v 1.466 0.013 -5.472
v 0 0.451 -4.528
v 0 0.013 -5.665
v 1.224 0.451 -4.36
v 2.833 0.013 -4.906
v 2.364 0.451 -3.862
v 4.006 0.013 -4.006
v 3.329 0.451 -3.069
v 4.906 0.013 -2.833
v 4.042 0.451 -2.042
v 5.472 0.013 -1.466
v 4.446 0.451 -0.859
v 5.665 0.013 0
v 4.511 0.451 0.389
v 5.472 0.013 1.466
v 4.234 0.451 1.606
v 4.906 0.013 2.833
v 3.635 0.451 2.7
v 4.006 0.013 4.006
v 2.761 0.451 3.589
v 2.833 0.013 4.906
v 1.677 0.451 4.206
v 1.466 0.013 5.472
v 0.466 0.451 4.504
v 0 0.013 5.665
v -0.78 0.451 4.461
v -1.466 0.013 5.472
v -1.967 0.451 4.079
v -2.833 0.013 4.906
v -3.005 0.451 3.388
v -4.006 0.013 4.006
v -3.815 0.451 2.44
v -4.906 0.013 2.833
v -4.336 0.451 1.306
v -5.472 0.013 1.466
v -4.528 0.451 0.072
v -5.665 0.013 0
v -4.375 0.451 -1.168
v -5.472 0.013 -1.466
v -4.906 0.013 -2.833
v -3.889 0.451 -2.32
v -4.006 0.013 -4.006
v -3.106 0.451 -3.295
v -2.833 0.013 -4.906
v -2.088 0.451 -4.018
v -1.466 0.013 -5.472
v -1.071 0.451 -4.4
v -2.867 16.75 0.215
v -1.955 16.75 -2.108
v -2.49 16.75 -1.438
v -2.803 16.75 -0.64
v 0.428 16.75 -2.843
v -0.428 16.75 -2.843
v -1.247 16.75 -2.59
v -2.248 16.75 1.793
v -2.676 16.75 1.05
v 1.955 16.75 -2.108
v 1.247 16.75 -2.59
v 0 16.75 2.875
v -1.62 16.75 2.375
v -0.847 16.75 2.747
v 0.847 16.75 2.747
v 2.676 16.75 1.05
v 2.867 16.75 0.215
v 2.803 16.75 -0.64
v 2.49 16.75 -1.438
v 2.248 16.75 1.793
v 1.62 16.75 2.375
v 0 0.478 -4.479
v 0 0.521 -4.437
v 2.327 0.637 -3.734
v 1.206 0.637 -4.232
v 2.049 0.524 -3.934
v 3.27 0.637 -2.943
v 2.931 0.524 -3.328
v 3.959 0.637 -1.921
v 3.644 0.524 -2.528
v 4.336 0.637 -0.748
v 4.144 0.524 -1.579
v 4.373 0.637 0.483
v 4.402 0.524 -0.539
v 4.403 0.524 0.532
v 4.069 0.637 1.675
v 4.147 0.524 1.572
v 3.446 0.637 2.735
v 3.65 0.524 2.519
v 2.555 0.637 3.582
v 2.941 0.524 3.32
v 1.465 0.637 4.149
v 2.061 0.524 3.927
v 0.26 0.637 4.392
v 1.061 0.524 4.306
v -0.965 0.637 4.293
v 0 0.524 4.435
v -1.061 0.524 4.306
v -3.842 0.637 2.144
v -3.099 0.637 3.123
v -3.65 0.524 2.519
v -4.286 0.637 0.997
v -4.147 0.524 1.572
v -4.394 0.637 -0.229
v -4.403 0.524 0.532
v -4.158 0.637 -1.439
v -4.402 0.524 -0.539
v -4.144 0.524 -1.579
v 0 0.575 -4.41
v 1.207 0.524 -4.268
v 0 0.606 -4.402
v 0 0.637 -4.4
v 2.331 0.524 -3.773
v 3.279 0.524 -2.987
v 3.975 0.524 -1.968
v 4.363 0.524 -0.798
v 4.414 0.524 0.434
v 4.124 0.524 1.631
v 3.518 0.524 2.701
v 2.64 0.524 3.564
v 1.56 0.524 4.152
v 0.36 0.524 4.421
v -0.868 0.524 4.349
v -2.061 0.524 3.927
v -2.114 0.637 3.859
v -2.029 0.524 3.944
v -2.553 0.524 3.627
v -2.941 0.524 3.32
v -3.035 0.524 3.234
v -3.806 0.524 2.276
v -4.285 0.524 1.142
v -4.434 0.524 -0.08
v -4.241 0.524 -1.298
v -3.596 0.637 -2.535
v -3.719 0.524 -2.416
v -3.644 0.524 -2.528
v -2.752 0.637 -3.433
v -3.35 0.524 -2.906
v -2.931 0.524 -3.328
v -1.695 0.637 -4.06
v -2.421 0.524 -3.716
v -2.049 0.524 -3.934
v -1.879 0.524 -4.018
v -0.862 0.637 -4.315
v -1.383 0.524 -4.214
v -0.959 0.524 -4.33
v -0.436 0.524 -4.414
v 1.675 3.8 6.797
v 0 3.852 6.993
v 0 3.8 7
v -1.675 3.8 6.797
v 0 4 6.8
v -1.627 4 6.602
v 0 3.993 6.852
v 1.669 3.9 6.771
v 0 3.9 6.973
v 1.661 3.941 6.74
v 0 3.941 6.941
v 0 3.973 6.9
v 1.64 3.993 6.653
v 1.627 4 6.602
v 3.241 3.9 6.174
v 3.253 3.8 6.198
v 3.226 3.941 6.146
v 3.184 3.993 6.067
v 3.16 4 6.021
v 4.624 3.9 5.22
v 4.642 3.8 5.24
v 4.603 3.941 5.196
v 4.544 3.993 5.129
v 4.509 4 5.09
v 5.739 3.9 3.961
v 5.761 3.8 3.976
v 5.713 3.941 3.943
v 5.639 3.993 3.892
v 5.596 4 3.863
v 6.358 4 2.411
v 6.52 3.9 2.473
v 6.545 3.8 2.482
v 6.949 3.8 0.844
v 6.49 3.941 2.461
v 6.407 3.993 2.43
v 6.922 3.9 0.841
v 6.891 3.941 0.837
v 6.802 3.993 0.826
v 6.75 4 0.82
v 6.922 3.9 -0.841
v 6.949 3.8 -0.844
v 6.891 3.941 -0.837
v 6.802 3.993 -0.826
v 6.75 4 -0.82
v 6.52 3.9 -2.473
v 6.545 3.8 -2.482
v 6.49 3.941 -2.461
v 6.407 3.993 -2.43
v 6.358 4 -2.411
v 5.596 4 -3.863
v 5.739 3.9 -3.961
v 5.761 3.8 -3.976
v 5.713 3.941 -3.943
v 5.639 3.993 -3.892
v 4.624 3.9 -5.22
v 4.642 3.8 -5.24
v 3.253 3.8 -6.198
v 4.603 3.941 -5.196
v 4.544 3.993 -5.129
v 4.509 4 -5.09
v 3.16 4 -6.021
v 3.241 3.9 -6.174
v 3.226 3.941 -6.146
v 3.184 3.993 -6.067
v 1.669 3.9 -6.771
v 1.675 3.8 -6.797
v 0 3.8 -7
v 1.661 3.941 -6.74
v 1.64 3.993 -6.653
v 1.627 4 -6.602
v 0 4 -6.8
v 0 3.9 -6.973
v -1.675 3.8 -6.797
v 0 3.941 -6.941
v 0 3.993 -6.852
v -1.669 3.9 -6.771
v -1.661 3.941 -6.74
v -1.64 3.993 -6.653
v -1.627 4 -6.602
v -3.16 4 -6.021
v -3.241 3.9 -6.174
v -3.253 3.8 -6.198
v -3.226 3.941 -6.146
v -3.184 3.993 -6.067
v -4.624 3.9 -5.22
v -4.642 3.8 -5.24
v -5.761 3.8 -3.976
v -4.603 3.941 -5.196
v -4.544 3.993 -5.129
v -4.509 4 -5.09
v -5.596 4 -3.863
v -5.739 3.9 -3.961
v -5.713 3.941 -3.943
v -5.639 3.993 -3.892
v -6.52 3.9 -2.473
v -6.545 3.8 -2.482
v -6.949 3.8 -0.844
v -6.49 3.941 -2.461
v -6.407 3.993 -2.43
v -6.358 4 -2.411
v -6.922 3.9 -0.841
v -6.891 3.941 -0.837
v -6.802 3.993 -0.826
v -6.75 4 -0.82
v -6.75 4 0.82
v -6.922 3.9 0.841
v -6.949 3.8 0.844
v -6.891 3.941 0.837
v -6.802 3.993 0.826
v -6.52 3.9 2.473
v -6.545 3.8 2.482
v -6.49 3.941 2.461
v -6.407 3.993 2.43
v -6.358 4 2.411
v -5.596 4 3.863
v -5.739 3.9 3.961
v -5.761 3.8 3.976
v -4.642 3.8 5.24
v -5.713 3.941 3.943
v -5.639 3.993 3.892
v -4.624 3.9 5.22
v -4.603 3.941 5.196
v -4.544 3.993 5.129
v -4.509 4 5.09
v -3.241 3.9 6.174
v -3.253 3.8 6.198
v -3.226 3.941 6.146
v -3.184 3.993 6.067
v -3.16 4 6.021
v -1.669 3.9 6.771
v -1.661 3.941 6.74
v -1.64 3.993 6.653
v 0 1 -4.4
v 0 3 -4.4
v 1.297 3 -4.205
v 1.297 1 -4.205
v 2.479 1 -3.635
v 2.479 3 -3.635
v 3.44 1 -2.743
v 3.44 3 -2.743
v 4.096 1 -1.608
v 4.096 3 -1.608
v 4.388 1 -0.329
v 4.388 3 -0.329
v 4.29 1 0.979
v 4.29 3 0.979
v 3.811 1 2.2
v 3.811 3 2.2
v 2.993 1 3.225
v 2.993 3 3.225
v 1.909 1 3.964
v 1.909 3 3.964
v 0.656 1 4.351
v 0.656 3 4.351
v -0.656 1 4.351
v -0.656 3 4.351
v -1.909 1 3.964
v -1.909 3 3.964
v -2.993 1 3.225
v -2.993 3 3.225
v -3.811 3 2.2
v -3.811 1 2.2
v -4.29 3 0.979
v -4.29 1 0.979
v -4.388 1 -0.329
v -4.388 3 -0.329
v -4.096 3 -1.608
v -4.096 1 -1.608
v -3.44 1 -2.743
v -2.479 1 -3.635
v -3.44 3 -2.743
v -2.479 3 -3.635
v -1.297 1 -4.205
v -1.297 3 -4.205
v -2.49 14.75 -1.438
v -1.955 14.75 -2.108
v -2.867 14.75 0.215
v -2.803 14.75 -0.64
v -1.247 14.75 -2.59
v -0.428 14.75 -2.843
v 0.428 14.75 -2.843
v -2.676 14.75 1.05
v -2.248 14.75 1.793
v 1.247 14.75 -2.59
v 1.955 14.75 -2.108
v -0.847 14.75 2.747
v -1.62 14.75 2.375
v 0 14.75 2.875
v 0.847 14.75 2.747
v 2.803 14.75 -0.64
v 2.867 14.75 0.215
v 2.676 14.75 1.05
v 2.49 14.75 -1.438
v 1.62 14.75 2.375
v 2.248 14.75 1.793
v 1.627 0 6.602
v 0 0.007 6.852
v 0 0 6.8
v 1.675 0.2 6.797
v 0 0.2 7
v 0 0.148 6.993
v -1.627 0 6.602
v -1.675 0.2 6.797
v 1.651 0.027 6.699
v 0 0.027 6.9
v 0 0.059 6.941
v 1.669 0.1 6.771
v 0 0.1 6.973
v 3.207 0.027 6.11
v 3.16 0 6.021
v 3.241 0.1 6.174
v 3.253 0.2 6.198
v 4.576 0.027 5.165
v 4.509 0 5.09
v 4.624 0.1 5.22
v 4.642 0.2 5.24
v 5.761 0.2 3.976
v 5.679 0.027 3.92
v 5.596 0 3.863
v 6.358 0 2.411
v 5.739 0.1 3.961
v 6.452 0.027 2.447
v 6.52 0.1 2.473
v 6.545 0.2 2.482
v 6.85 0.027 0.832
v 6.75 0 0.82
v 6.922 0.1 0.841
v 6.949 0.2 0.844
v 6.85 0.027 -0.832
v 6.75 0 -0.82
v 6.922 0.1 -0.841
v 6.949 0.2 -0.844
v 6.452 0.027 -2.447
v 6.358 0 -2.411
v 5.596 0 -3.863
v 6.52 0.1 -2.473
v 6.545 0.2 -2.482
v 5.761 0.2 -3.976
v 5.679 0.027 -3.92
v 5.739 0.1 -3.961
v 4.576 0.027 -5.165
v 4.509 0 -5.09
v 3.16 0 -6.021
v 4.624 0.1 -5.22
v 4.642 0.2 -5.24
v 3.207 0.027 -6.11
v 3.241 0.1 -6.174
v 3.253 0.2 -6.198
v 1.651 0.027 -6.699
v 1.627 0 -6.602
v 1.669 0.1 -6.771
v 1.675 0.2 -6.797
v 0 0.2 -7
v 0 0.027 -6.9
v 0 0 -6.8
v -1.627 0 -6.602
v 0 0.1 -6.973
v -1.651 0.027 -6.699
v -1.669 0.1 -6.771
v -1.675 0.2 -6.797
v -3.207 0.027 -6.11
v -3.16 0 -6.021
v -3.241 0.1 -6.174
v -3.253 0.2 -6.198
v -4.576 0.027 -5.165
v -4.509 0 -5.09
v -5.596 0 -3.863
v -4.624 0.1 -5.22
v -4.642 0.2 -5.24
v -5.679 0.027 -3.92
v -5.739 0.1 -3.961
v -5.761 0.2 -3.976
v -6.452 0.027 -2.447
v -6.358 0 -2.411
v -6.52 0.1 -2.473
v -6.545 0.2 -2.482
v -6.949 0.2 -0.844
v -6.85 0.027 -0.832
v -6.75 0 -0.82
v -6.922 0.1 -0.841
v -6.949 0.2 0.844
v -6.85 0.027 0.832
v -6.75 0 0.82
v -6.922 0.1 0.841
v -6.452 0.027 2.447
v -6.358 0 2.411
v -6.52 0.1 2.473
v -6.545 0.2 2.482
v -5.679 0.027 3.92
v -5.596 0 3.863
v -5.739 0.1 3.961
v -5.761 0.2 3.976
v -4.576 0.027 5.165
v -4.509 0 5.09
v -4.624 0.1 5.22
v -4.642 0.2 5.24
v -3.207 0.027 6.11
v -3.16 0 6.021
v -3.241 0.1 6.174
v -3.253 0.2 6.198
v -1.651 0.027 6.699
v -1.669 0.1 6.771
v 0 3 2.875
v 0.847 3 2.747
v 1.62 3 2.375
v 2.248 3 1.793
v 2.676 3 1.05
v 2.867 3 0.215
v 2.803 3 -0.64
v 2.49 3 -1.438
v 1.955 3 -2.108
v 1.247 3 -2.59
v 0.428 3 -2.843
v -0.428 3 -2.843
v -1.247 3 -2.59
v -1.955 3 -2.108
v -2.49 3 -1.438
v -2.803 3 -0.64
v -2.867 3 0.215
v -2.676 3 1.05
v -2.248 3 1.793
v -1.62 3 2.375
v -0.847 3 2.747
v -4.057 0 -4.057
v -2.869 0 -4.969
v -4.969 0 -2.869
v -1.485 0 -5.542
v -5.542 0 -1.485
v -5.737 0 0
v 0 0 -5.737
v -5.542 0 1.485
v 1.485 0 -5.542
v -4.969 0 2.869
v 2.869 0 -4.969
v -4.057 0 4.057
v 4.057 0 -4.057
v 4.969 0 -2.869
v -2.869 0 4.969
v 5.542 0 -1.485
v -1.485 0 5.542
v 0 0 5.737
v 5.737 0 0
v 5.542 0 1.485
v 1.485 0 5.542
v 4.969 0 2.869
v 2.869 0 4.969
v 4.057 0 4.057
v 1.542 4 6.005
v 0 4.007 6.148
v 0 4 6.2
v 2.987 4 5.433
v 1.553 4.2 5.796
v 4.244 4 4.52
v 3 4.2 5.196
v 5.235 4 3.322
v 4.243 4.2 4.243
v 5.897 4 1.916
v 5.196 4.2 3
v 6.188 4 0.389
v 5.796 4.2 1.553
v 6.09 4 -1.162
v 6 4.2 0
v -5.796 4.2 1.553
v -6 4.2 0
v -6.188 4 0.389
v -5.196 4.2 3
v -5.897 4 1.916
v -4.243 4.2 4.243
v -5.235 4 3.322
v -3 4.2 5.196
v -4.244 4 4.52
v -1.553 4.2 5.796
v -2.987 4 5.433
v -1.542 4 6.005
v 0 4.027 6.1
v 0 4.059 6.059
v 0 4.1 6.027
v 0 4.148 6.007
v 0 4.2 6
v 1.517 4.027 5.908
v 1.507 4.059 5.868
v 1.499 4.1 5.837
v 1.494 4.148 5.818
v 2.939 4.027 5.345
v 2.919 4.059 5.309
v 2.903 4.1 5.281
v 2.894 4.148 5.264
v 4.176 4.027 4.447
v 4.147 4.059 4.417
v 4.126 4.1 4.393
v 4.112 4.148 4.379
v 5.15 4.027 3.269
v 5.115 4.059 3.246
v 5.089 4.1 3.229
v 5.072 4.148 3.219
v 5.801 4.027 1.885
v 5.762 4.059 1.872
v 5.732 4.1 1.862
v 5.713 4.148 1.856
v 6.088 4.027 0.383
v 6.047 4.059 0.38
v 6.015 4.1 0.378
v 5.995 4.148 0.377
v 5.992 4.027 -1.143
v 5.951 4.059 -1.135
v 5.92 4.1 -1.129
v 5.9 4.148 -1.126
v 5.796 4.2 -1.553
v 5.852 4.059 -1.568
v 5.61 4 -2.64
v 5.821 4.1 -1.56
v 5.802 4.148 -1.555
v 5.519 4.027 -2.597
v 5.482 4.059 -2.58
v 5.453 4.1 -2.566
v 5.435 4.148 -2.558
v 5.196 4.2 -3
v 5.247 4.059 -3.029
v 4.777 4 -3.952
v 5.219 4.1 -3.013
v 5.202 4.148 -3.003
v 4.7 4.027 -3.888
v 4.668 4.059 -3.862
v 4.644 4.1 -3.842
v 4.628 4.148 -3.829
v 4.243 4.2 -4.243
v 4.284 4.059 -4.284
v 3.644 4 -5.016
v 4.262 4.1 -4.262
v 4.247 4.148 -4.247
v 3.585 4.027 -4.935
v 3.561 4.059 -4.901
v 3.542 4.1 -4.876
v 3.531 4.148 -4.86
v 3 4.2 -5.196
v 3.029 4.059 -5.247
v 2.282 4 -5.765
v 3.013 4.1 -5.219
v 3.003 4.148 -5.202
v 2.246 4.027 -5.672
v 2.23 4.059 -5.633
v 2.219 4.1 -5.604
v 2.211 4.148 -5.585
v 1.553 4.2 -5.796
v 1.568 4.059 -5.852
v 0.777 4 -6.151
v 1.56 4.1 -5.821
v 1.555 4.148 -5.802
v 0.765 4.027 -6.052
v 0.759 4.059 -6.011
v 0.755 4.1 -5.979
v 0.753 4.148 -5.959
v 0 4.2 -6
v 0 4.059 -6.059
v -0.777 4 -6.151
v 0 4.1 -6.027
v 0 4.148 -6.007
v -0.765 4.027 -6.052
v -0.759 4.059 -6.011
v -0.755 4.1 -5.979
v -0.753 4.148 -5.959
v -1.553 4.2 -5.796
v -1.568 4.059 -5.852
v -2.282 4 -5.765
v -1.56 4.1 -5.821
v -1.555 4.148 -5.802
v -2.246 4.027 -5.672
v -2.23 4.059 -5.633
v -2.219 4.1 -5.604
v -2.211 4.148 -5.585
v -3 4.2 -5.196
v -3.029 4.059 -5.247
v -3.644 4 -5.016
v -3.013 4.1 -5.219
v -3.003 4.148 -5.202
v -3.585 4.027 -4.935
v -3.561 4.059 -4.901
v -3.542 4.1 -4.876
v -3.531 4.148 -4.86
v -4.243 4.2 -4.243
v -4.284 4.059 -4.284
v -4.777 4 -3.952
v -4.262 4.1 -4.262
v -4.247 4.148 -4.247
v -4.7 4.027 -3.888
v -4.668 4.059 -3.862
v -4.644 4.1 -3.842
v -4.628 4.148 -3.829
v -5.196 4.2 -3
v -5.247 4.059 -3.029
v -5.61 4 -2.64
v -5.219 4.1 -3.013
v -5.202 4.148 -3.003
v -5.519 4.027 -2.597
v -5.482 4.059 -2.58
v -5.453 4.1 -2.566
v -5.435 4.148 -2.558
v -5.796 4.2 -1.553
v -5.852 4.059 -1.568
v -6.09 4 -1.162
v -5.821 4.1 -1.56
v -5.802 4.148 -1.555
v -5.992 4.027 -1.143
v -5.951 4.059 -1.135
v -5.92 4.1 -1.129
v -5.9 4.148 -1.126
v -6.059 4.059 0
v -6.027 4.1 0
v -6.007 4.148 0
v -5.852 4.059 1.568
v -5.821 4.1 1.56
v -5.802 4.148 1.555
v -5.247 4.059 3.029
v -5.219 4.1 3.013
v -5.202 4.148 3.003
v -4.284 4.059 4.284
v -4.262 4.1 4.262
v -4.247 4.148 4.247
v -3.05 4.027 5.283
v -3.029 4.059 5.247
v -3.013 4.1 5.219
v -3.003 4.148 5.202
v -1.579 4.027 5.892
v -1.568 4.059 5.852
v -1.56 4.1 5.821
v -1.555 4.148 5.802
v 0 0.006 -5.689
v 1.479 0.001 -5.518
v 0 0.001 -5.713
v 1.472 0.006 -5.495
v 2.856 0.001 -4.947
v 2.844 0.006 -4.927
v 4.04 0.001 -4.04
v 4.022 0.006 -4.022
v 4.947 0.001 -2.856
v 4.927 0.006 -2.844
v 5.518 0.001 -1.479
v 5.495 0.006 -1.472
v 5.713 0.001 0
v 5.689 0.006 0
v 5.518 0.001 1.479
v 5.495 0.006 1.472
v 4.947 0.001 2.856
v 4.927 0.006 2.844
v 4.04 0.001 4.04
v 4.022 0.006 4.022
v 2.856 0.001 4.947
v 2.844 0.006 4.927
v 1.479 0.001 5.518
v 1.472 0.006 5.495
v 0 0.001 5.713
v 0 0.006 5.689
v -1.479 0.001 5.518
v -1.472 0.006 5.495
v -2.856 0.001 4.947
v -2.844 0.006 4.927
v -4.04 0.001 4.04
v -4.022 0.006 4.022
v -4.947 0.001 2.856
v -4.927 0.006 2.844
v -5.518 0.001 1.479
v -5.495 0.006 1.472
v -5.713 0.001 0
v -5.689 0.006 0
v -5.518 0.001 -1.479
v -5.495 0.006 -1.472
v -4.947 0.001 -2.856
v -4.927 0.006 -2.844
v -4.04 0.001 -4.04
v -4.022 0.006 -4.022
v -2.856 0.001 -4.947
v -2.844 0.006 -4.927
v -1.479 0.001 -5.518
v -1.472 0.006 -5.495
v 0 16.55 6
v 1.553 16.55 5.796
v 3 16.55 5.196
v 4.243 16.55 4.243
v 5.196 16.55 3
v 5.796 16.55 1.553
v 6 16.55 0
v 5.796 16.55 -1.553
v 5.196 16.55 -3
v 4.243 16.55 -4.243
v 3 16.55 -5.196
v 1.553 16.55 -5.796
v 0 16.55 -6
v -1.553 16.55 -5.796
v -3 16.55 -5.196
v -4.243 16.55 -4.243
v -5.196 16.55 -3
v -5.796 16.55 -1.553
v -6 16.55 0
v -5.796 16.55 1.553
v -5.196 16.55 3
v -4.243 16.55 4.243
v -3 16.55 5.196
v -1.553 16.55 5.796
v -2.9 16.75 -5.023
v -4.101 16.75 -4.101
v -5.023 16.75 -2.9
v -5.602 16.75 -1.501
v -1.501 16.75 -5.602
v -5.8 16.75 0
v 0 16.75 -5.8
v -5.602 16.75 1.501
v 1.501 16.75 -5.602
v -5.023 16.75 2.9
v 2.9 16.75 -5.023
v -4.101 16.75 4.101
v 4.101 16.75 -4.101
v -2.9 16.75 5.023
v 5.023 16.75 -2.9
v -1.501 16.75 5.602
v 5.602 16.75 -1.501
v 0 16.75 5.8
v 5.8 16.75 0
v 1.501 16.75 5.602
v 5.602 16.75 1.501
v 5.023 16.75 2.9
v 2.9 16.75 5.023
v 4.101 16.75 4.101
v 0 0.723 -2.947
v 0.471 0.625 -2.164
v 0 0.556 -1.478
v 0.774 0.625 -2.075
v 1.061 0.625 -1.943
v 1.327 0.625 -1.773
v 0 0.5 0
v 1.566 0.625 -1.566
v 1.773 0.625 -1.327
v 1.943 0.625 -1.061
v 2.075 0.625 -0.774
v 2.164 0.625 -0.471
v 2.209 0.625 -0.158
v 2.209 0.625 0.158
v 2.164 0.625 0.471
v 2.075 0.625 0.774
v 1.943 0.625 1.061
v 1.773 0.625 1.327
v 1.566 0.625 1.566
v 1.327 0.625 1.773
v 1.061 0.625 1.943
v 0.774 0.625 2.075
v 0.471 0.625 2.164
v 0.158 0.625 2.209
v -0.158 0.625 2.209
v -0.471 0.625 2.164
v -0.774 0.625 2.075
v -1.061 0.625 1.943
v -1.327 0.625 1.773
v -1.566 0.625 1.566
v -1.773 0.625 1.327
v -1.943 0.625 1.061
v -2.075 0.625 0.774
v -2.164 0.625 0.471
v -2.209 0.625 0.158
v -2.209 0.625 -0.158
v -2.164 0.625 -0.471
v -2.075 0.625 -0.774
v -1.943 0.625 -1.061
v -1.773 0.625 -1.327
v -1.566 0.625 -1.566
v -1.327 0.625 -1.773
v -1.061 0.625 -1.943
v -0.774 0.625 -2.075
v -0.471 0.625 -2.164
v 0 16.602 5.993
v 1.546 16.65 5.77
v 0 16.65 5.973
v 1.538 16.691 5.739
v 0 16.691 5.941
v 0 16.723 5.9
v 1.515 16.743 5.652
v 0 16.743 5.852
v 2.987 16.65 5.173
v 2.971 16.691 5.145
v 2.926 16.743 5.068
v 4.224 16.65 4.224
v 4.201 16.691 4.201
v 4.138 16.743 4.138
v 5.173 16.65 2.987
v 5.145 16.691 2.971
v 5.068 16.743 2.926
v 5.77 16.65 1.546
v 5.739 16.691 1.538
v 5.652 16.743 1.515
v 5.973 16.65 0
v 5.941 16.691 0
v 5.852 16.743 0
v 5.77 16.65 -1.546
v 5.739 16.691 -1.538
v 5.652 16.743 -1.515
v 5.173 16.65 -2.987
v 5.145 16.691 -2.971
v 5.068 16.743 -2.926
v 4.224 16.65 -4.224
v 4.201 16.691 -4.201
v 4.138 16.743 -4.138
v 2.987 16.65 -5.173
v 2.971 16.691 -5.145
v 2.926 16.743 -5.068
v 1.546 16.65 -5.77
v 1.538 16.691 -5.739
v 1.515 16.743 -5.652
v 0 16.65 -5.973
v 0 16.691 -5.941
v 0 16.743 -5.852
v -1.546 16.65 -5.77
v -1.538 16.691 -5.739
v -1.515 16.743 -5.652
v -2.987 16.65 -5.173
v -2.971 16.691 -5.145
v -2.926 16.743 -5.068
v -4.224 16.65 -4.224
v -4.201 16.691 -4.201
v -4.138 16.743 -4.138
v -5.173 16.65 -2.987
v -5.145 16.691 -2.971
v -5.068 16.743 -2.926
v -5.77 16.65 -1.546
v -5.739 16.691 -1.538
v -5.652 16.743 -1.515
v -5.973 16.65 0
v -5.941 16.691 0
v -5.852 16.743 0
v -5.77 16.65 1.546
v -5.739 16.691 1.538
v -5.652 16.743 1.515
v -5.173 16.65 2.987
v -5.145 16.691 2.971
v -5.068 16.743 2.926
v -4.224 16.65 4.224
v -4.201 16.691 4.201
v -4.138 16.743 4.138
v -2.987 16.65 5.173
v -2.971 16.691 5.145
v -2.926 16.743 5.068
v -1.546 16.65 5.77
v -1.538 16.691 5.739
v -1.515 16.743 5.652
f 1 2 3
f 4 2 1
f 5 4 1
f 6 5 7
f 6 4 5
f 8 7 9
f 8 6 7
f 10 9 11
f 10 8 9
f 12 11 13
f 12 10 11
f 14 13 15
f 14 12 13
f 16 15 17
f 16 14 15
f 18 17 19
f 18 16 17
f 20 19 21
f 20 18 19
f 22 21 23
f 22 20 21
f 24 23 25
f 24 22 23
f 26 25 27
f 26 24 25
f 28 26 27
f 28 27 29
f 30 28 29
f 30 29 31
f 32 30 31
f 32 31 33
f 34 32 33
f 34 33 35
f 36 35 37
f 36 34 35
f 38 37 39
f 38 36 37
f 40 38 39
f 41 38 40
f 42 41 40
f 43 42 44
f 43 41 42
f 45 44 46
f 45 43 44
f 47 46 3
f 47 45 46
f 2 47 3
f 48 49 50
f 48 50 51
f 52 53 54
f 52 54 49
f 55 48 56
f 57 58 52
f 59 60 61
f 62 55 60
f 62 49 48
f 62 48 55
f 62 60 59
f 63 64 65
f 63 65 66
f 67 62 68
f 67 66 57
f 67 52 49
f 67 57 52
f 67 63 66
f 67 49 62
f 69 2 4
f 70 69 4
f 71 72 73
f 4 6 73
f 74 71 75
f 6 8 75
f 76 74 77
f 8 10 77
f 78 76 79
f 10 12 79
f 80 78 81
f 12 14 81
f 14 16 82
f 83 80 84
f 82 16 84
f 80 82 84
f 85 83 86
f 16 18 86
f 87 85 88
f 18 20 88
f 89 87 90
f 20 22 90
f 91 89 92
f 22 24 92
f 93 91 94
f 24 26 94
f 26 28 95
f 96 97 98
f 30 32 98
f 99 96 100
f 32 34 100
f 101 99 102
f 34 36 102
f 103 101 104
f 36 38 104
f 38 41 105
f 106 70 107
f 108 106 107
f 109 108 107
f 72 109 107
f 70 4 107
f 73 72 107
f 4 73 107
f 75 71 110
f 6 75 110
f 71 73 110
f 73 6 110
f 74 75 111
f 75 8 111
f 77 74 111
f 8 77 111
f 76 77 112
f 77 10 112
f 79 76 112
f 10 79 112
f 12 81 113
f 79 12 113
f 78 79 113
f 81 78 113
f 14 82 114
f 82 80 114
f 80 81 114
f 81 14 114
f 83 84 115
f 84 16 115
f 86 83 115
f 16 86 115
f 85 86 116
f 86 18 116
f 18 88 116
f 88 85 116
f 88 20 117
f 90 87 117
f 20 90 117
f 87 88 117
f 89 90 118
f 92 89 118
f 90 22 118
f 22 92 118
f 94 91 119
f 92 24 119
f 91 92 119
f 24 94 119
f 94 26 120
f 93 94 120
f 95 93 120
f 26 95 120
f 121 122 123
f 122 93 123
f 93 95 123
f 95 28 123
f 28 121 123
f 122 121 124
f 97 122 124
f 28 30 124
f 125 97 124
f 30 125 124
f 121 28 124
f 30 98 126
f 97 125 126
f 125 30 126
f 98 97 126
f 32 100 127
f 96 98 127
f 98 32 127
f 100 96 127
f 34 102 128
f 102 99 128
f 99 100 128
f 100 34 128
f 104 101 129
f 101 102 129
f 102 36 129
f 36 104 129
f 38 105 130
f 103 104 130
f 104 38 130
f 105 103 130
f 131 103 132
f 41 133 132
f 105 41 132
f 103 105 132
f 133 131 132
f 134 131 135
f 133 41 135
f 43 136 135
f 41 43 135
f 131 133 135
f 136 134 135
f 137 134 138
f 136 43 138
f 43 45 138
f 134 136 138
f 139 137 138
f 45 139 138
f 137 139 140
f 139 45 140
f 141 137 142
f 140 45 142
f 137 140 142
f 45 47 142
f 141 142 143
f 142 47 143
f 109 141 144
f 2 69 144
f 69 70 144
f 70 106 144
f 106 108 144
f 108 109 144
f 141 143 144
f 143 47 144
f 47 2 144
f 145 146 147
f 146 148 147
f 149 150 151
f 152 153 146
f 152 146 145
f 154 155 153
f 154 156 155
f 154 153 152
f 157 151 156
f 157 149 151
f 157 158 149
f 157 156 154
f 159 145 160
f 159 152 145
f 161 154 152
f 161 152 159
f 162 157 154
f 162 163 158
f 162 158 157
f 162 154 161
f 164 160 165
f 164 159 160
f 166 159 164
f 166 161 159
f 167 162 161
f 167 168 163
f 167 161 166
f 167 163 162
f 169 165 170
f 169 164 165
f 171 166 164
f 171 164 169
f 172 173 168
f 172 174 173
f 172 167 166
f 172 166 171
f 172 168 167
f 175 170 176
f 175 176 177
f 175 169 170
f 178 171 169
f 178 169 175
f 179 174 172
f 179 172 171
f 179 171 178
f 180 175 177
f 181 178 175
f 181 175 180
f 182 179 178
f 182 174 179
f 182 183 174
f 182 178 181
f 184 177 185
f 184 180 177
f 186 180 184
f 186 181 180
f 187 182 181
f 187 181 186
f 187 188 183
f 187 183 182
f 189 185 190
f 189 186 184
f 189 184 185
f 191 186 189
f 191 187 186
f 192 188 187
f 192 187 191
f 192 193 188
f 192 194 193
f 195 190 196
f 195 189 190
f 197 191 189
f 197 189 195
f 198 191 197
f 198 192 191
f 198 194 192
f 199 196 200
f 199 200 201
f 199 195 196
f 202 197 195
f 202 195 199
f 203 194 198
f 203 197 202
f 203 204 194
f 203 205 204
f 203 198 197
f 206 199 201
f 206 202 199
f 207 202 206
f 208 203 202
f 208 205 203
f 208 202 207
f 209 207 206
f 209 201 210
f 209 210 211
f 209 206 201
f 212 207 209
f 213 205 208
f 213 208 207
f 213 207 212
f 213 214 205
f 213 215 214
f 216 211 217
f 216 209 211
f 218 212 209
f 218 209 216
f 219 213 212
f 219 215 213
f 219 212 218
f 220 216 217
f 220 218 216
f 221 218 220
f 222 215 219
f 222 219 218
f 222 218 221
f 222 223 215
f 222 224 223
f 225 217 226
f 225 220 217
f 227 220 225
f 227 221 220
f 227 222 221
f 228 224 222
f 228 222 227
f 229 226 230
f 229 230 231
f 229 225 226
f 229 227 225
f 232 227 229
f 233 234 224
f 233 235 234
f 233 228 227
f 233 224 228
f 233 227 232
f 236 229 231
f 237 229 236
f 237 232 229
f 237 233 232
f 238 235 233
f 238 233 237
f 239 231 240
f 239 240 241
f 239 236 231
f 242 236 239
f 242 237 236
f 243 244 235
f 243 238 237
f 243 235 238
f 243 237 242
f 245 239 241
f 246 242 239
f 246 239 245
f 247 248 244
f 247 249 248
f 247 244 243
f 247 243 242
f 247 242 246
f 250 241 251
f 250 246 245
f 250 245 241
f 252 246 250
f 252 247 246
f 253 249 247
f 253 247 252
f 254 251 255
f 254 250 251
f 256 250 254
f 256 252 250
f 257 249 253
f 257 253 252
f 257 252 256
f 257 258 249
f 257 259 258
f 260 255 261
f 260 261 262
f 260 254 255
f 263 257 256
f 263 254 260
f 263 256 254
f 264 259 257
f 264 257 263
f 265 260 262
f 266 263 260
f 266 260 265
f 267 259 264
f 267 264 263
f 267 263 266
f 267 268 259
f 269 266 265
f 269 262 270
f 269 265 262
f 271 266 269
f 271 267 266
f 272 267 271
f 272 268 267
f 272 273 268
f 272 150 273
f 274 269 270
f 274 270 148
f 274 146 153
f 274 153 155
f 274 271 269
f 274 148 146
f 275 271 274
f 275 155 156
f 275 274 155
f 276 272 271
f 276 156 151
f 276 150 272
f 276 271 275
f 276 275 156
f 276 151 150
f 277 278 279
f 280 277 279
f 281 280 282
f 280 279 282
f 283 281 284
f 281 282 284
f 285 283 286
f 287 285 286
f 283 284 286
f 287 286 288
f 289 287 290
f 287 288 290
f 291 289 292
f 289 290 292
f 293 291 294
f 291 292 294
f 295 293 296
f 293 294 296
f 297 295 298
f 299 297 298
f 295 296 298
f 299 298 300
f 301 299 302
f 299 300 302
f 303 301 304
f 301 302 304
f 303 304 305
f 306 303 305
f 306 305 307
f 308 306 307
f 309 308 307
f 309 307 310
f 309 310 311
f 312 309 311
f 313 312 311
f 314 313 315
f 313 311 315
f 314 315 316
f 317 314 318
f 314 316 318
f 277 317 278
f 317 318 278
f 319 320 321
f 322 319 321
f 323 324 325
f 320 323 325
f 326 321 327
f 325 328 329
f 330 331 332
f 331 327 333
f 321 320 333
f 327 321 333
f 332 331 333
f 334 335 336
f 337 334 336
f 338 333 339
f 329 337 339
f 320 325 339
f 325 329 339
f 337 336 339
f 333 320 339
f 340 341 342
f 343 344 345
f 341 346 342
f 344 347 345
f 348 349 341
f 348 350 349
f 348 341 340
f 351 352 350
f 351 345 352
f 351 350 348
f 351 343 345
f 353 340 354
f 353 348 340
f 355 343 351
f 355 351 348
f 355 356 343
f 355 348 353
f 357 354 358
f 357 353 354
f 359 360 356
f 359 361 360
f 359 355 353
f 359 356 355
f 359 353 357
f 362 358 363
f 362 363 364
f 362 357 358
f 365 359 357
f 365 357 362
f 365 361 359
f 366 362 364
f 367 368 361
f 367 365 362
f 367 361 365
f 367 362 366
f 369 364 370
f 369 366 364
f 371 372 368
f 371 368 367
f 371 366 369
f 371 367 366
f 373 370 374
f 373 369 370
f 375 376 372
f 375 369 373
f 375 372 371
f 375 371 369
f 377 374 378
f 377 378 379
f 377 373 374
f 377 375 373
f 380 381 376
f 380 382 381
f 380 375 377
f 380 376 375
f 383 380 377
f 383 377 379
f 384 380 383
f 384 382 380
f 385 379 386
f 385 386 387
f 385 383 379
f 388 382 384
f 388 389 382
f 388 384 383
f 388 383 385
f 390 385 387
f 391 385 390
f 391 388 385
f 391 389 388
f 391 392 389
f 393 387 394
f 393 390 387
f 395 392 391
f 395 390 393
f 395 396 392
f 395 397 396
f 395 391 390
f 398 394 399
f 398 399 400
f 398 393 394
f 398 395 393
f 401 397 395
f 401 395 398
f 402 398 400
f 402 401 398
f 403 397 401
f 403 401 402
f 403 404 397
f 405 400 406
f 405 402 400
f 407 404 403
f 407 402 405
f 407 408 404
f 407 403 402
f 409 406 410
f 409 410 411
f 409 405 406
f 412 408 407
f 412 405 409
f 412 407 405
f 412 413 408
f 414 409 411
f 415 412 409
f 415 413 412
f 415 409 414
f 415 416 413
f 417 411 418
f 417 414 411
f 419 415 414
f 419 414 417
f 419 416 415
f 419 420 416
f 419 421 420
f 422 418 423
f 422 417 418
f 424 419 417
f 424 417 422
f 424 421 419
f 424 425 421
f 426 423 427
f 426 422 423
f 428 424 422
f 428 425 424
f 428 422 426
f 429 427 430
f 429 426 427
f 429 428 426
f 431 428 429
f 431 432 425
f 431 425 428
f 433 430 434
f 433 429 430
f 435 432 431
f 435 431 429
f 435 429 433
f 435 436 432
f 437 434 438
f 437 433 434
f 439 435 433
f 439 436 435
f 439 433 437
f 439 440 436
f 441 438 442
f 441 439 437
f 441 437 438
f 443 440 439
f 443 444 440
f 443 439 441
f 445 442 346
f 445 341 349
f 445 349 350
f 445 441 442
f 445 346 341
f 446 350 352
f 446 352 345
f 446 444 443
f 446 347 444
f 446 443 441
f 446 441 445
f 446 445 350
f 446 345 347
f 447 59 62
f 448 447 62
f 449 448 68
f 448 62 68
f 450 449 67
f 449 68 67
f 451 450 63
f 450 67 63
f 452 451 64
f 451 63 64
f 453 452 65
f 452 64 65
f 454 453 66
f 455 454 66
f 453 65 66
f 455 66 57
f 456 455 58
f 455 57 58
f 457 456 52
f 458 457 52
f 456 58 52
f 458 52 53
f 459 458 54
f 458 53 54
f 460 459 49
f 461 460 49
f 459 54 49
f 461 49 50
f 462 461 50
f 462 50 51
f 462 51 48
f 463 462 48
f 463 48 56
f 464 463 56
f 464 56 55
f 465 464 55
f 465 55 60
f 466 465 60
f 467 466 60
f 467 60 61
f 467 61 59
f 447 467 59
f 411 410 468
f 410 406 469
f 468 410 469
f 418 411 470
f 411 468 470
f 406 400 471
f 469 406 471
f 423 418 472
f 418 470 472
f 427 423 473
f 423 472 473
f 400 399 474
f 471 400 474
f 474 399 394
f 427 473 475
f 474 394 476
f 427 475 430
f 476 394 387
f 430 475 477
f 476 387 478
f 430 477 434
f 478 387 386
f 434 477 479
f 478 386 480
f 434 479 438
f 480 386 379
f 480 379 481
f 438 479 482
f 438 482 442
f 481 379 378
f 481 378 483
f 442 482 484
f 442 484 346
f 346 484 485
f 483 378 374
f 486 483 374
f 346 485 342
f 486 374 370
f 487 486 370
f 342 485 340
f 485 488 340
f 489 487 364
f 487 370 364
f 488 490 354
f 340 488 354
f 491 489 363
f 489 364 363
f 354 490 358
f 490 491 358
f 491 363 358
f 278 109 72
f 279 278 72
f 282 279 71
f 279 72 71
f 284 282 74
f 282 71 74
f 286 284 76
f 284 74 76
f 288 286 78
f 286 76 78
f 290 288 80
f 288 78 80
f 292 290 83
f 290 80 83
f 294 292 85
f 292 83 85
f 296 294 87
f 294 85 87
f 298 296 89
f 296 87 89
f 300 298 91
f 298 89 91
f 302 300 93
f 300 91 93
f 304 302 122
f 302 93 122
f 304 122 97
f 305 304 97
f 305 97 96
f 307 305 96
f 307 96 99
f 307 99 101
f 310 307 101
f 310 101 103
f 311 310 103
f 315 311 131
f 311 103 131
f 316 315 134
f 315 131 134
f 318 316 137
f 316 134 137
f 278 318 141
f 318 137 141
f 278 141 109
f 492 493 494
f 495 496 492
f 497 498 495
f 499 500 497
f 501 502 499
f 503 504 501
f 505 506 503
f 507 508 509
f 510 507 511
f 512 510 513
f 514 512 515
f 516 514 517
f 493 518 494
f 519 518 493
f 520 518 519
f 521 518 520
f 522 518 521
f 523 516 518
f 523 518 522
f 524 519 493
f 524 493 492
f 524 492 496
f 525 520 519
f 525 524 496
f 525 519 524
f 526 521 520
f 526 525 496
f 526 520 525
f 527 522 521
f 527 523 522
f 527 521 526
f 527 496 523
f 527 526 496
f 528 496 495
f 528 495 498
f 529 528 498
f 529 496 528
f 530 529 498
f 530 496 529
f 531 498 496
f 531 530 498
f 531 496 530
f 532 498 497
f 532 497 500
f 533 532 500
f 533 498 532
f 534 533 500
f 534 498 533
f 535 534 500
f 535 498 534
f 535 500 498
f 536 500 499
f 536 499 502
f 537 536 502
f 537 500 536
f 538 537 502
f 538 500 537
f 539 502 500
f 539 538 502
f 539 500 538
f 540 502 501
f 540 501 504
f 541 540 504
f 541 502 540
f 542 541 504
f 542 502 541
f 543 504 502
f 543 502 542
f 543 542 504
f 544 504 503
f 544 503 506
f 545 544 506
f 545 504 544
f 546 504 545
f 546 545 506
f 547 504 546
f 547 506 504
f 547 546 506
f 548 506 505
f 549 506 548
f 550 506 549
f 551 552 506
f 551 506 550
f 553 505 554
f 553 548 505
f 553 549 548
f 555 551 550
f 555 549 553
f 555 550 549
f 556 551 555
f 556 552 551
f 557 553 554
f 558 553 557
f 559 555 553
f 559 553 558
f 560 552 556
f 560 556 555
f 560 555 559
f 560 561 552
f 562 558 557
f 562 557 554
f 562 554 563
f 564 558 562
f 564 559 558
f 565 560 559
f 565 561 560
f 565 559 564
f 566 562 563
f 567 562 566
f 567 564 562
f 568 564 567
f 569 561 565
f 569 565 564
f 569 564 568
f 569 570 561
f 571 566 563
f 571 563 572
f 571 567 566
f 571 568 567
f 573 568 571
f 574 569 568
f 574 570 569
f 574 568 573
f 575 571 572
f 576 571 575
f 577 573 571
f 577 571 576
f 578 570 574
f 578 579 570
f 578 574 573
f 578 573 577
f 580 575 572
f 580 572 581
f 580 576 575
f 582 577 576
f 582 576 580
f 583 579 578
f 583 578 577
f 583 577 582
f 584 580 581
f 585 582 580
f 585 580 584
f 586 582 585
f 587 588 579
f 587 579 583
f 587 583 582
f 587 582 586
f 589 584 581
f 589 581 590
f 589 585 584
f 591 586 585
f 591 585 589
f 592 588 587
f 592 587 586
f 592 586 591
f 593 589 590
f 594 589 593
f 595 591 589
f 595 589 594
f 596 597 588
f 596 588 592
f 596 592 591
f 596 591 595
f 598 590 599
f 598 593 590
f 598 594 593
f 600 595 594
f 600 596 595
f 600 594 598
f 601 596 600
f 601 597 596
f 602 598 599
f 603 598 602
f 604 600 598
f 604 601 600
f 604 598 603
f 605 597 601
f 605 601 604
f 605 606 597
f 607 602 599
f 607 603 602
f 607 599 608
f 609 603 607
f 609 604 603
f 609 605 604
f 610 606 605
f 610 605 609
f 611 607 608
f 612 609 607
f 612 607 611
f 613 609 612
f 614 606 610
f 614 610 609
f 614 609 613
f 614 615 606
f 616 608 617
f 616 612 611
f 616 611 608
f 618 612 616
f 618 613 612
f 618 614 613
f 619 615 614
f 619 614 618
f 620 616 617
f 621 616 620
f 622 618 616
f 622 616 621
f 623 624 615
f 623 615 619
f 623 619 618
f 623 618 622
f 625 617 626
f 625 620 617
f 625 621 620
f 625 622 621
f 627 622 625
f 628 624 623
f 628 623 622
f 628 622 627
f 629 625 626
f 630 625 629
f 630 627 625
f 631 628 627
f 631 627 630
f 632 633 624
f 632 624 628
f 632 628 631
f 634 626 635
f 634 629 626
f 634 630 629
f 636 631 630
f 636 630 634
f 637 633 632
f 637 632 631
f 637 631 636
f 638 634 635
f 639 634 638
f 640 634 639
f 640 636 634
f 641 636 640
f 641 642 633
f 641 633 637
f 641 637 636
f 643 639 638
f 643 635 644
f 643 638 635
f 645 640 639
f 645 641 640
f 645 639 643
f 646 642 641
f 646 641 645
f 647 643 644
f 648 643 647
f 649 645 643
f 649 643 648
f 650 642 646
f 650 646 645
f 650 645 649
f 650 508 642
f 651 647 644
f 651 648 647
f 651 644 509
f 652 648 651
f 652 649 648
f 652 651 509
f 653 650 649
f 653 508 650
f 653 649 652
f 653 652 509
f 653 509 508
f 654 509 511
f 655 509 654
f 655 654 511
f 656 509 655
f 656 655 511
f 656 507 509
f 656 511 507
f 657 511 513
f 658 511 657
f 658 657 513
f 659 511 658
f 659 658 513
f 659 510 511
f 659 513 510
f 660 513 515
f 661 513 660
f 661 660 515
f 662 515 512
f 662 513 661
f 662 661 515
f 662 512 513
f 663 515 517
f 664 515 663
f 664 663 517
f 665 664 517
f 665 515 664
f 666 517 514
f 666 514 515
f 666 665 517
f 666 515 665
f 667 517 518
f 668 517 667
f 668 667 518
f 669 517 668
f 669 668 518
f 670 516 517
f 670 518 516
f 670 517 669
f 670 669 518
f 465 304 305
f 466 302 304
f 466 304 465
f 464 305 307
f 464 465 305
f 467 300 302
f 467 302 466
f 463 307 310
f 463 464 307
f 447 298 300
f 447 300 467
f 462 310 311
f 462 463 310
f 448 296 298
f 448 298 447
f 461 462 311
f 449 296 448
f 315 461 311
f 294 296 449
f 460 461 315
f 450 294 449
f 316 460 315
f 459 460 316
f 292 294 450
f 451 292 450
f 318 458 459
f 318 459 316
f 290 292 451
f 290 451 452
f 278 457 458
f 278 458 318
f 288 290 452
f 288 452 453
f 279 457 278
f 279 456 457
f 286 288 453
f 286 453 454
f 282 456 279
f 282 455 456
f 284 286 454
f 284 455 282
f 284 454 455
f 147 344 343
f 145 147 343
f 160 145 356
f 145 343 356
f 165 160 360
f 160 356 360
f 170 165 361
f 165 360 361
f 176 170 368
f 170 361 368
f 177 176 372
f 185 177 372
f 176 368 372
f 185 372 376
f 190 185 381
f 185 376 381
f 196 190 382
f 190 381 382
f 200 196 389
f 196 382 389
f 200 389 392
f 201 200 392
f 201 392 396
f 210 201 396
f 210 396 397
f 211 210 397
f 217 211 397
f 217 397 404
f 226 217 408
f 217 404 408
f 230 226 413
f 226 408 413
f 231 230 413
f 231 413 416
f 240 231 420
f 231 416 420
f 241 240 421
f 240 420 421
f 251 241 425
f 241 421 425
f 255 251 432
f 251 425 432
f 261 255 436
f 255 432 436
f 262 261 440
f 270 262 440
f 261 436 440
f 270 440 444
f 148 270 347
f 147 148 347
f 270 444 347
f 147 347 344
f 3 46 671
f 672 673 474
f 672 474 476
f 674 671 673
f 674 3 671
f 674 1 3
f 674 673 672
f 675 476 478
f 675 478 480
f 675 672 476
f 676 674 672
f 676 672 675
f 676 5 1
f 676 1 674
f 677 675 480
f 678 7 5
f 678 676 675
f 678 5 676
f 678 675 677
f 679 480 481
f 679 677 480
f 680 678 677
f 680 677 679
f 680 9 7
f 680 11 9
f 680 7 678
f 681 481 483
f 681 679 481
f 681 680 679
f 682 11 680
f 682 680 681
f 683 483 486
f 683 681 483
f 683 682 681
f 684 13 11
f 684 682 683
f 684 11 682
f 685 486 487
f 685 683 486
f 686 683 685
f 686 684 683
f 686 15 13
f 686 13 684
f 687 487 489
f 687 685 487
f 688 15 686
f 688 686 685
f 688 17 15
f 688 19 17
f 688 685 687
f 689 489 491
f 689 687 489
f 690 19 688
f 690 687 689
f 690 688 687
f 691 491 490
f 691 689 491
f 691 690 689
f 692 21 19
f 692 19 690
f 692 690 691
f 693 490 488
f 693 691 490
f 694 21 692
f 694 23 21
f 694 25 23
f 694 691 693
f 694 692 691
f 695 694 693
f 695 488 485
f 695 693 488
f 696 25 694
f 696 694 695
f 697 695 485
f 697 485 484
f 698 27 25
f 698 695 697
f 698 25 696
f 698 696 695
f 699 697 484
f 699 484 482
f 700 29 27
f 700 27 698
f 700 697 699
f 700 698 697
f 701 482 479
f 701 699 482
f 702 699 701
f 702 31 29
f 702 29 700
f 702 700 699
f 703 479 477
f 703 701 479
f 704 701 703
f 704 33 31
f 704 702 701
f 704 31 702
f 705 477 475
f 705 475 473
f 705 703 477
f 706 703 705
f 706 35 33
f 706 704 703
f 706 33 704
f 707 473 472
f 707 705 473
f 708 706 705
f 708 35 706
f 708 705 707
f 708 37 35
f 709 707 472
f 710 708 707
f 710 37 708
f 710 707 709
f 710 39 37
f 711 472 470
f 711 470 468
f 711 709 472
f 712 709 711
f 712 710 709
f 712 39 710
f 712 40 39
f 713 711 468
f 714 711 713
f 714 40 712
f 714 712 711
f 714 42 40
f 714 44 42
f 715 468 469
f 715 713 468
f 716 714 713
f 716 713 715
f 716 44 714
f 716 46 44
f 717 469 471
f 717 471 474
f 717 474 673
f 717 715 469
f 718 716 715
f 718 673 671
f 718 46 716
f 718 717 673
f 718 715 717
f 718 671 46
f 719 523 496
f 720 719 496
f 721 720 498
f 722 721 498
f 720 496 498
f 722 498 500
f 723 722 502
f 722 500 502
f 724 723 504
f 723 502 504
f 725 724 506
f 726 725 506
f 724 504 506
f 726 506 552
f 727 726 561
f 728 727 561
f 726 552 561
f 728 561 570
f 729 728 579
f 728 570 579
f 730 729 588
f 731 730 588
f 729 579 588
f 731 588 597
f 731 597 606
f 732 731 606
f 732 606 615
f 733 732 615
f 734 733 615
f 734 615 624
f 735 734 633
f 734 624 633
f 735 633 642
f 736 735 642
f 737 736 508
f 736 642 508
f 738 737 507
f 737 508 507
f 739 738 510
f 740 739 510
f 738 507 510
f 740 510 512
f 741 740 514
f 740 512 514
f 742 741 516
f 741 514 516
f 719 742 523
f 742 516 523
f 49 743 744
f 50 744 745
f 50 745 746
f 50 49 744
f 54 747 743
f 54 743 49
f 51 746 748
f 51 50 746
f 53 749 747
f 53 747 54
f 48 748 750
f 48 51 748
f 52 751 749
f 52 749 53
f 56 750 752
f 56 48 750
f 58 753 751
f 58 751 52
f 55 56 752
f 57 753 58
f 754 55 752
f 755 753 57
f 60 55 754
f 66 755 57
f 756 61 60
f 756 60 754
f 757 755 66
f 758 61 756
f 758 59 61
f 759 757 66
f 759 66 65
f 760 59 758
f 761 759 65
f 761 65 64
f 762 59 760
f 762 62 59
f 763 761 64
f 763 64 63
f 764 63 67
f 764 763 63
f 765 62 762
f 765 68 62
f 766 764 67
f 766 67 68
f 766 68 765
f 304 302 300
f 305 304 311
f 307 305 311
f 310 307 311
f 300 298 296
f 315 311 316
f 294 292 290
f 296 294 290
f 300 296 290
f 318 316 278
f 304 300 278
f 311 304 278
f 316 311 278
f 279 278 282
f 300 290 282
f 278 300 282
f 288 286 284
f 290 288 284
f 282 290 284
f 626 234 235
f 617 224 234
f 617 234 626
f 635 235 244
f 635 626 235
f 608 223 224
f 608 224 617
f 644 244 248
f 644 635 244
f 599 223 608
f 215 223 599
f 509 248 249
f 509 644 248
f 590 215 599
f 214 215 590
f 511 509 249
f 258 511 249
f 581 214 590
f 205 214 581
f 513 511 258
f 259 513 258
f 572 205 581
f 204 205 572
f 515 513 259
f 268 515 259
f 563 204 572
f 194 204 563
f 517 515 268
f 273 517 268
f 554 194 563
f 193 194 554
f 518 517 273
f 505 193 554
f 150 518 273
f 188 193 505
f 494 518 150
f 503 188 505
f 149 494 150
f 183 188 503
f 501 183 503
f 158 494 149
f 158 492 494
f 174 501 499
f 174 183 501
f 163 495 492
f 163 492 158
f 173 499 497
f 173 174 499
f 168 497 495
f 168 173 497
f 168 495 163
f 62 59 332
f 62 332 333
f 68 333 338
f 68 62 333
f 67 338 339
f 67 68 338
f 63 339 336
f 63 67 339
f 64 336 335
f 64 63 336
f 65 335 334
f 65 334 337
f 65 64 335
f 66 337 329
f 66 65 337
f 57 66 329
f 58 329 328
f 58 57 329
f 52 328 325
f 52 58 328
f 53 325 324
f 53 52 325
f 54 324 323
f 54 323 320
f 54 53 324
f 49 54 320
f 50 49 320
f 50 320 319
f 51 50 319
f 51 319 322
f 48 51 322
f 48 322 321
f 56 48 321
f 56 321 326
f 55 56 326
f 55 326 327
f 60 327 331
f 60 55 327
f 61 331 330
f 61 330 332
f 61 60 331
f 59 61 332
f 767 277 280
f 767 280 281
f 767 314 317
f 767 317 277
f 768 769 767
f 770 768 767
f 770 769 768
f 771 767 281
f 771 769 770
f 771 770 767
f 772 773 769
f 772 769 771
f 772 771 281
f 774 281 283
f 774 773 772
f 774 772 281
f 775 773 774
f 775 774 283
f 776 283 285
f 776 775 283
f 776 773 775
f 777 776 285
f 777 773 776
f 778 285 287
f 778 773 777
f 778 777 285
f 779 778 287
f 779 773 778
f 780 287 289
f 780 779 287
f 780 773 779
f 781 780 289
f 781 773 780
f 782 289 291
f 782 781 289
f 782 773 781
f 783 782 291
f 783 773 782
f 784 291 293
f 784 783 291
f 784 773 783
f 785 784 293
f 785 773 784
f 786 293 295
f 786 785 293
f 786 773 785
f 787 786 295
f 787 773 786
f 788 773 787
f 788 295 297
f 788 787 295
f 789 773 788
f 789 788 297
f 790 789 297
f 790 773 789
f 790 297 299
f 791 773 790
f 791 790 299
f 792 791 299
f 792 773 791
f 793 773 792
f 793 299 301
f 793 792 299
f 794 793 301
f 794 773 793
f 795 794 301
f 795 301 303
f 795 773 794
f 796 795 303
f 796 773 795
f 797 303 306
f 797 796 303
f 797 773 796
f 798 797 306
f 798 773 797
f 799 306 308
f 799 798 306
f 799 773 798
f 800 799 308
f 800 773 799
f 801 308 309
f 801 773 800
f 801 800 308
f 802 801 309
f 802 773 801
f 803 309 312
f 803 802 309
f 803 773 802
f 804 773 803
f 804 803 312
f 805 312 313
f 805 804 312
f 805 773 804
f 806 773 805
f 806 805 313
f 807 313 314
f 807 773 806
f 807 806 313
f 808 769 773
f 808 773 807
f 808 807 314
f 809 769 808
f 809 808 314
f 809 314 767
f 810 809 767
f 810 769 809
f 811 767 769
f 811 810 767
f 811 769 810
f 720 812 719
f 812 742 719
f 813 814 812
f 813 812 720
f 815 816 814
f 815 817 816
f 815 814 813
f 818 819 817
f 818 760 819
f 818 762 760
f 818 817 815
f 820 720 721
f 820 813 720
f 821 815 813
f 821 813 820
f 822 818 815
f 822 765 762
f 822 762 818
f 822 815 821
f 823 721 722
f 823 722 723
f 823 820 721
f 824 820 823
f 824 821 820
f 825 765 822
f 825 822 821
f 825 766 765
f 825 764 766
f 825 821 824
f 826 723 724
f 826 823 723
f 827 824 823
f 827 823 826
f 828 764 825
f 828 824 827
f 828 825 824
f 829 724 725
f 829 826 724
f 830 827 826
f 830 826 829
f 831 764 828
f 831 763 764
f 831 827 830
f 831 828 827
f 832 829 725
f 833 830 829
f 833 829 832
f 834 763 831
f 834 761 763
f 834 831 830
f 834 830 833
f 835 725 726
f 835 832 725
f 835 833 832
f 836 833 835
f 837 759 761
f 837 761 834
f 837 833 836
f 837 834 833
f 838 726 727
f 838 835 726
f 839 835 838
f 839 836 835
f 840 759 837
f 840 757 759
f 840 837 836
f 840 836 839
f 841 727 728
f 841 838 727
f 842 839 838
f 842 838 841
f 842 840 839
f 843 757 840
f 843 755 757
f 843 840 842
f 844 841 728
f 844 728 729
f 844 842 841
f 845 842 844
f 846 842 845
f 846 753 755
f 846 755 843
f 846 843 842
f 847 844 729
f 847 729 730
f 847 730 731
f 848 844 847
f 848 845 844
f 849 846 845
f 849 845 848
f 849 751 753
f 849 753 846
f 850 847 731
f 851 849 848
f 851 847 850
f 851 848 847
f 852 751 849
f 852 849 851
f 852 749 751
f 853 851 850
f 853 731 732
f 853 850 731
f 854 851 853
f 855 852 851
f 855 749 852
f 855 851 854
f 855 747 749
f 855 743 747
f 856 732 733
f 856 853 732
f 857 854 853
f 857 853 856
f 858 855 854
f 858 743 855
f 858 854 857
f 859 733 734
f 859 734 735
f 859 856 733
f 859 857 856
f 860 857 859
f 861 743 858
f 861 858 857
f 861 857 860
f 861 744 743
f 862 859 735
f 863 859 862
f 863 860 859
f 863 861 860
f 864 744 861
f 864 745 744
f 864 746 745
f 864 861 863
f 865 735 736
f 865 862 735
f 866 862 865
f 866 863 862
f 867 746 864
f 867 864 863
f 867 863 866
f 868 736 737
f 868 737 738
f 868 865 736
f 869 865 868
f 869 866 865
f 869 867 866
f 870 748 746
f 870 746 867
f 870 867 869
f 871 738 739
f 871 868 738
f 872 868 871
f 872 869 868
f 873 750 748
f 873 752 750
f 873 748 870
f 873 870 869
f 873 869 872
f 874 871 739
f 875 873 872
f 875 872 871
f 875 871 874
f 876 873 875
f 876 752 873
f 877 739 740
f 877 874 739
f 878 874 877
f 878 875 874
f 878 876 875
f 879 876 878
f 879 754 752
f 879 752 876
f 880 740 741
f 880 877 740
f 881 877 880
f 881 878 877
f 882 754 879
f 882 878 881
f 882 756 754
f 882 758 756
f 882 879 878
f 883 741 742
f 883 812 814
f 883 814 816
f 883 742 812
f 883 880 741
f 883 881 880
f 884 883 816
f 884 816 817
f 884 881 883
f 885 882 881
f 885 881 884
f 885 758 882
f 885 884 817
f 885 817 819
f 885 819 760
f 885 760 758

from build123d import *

# Parameters (mm, degrees)
SKETCH1_R           = 7
BOSS_EXTRUDE1_DEPTH = 4
SKETCH2_R           = 6
BOSS_EXTRUDE2_DEPTH = 12.75
SKETCH3_R           = 2.875
CUT_EXTRUDE1_DEPTH  = 20.456682657
SKETCH4_R           = 4.4
CUT_EXTRUDE2_DEPTH  = 3
CHAMFER1_SIZE       = 1.3
CHAMFER1_SIZE2      = 0.5
SKETCH5_R           = 4.4
BOSS_EXTRUDE3_DEPTH = 2
DOME1_FACE_RADIUS   = 4.4
DOME1_HEIGHT        = 0.5
FILLET1_R           = 0.2
SKETCH6_R           = 2.875
BOSS_EXTRUDE4_DEPTH = 2


with BuildPart() as part:
    # Sketch1 → Boss-Extrude1 (new body)
    with BuildSketch(Plane(origin=(0, 0, 0), x_dir=(1, 0, 0), z_dir=(0, 1, 0))):
        with Locations(Location((0, 0, 0), (0, 0, 270))):
            Circle(SKETCH1_R)
    extrude(amount=BOSS_EXTRUDE1_DEPTH)

    # Sketch2 → Boss-Extrude2 (add)
    with BuildSketch(Plane(origin=(0, 4, 0), x_dir=(1, 0, 0), z_dir=(0, 1, 0))):
        with Locations(Location((0, 0, 0), (0, 0, 270))):
            Circle(SKETCH2_R)
    extrude(amount=BOSS_EXTRUDE2_DEPTH)

    # Sketch3 → Cut-Extrude1 (cut, through all)
    with BuildSketch(Plane(origin=(0, 16.75, 0), x_dir=(1, 0, 0), z_dir=(0, 1, 0))):
        with Locations(Location((0, 0, 0), (0, 0, 270))):
            Circle(SKETCH3_R)
    extrude(amount=-CUT_EXTRUDE1_DEPTH, mode=Mode.SUBTRACT)

    # Sketch4 → Cut-Extrude2 (cut)
    with BuildSketch(Plane(origin=(0, 0, 0), x_dir=(-1, 0, 0), z_dir=(0, -1, 0))):
        with Locations(Location((0, 0, 0), (0, 0, 90))):
            Circle(SKETCH4_R)
    extrude(amount=-CUT_EXTRUDE2_DEPTH, mode=Mode.SUBTRACT)

    # Chamfer1
    chamfer1_edges = [part.edges().sort_by_distance(p)[0] for p in [
        (0, 0, 4.4),
    ]]
    chamfer1_side = [part.faces().sort_by_distance(p)[0] for p in [
        (0, 0, -6.802010101),
    ]]
    chamfer(chamfer1_edges, length=CHAMFER1_SIZE, length2=CHAMFER1_SIZE2, reference=chamfer1_side[0])

    # Fillet1
    fillet1_edges = [part.edges().sort_by_distance(p)[0] for p in [
        (0, 0, -7),
        (0, 0.5, 4.4),
        (0, 0, 5.7),
        (0, 4, -7),
        (0, 4, -6),
        (0, 16.75, -6),
    ]]
    fillet(fillet1_edges, radius=FILLET1_R)


with BuildPart() as body_2:
    # Sketch5 → Boss-Extrude3 (new body)
    with BuildSketch(Plane(origin=(0, 3, 0), x_dir=(-1, 0, 0), z_dir=(0, -1, 0))):
        with Locations(Location((0, 0, 0), (0, 0, 90))):
            Circle(SKETCH5_R)
    extrude(amount=BOSS_EXTRUDE3_DEPTH)

    # Dome1: a dome of height H over a round flat face of radius A is a cap of a sphere of radius (A * A + H * H) / (2 * H)
    dome1_r = (DOME1_FACE_RADIUS * DOME1_FACE_RADIUS + DOME1_HEIGHT * DOME1_HEIGHT) / (2 * DOME1_HEIGHT)
    dome1_base = Plane((0, 1, 0), z_dir=(0, -1, 0))
    with Locations(dome1_base.offset(DOME1_HEIGHT - dome1_r)):
        dome1_ball = Sphere(dome1_r, mode=Mode.PRIVATE)
    add(split(dome1_ball, bisect_by=dome1_base, keep=Keep.TOP, mode=Mode.PRIVATE))


with BuildPart() as body_3:
    # Sketch6 → Boss-Extrude4 (new body)
    with BuildSketch(Plane(origin=(0, 16.75, 0), x_dir=(1, 0, 0), z_dir=(0, 1, 0))):
        with Locations(Location((0, 0, 0), (0, 0, 270))):
            Circle(SKETCH6_R)
    extrude(amount=-BOSS_EXTRUDE4_DEPTH)


solid = Compound([part.part, body_2.part, body_3.part])
